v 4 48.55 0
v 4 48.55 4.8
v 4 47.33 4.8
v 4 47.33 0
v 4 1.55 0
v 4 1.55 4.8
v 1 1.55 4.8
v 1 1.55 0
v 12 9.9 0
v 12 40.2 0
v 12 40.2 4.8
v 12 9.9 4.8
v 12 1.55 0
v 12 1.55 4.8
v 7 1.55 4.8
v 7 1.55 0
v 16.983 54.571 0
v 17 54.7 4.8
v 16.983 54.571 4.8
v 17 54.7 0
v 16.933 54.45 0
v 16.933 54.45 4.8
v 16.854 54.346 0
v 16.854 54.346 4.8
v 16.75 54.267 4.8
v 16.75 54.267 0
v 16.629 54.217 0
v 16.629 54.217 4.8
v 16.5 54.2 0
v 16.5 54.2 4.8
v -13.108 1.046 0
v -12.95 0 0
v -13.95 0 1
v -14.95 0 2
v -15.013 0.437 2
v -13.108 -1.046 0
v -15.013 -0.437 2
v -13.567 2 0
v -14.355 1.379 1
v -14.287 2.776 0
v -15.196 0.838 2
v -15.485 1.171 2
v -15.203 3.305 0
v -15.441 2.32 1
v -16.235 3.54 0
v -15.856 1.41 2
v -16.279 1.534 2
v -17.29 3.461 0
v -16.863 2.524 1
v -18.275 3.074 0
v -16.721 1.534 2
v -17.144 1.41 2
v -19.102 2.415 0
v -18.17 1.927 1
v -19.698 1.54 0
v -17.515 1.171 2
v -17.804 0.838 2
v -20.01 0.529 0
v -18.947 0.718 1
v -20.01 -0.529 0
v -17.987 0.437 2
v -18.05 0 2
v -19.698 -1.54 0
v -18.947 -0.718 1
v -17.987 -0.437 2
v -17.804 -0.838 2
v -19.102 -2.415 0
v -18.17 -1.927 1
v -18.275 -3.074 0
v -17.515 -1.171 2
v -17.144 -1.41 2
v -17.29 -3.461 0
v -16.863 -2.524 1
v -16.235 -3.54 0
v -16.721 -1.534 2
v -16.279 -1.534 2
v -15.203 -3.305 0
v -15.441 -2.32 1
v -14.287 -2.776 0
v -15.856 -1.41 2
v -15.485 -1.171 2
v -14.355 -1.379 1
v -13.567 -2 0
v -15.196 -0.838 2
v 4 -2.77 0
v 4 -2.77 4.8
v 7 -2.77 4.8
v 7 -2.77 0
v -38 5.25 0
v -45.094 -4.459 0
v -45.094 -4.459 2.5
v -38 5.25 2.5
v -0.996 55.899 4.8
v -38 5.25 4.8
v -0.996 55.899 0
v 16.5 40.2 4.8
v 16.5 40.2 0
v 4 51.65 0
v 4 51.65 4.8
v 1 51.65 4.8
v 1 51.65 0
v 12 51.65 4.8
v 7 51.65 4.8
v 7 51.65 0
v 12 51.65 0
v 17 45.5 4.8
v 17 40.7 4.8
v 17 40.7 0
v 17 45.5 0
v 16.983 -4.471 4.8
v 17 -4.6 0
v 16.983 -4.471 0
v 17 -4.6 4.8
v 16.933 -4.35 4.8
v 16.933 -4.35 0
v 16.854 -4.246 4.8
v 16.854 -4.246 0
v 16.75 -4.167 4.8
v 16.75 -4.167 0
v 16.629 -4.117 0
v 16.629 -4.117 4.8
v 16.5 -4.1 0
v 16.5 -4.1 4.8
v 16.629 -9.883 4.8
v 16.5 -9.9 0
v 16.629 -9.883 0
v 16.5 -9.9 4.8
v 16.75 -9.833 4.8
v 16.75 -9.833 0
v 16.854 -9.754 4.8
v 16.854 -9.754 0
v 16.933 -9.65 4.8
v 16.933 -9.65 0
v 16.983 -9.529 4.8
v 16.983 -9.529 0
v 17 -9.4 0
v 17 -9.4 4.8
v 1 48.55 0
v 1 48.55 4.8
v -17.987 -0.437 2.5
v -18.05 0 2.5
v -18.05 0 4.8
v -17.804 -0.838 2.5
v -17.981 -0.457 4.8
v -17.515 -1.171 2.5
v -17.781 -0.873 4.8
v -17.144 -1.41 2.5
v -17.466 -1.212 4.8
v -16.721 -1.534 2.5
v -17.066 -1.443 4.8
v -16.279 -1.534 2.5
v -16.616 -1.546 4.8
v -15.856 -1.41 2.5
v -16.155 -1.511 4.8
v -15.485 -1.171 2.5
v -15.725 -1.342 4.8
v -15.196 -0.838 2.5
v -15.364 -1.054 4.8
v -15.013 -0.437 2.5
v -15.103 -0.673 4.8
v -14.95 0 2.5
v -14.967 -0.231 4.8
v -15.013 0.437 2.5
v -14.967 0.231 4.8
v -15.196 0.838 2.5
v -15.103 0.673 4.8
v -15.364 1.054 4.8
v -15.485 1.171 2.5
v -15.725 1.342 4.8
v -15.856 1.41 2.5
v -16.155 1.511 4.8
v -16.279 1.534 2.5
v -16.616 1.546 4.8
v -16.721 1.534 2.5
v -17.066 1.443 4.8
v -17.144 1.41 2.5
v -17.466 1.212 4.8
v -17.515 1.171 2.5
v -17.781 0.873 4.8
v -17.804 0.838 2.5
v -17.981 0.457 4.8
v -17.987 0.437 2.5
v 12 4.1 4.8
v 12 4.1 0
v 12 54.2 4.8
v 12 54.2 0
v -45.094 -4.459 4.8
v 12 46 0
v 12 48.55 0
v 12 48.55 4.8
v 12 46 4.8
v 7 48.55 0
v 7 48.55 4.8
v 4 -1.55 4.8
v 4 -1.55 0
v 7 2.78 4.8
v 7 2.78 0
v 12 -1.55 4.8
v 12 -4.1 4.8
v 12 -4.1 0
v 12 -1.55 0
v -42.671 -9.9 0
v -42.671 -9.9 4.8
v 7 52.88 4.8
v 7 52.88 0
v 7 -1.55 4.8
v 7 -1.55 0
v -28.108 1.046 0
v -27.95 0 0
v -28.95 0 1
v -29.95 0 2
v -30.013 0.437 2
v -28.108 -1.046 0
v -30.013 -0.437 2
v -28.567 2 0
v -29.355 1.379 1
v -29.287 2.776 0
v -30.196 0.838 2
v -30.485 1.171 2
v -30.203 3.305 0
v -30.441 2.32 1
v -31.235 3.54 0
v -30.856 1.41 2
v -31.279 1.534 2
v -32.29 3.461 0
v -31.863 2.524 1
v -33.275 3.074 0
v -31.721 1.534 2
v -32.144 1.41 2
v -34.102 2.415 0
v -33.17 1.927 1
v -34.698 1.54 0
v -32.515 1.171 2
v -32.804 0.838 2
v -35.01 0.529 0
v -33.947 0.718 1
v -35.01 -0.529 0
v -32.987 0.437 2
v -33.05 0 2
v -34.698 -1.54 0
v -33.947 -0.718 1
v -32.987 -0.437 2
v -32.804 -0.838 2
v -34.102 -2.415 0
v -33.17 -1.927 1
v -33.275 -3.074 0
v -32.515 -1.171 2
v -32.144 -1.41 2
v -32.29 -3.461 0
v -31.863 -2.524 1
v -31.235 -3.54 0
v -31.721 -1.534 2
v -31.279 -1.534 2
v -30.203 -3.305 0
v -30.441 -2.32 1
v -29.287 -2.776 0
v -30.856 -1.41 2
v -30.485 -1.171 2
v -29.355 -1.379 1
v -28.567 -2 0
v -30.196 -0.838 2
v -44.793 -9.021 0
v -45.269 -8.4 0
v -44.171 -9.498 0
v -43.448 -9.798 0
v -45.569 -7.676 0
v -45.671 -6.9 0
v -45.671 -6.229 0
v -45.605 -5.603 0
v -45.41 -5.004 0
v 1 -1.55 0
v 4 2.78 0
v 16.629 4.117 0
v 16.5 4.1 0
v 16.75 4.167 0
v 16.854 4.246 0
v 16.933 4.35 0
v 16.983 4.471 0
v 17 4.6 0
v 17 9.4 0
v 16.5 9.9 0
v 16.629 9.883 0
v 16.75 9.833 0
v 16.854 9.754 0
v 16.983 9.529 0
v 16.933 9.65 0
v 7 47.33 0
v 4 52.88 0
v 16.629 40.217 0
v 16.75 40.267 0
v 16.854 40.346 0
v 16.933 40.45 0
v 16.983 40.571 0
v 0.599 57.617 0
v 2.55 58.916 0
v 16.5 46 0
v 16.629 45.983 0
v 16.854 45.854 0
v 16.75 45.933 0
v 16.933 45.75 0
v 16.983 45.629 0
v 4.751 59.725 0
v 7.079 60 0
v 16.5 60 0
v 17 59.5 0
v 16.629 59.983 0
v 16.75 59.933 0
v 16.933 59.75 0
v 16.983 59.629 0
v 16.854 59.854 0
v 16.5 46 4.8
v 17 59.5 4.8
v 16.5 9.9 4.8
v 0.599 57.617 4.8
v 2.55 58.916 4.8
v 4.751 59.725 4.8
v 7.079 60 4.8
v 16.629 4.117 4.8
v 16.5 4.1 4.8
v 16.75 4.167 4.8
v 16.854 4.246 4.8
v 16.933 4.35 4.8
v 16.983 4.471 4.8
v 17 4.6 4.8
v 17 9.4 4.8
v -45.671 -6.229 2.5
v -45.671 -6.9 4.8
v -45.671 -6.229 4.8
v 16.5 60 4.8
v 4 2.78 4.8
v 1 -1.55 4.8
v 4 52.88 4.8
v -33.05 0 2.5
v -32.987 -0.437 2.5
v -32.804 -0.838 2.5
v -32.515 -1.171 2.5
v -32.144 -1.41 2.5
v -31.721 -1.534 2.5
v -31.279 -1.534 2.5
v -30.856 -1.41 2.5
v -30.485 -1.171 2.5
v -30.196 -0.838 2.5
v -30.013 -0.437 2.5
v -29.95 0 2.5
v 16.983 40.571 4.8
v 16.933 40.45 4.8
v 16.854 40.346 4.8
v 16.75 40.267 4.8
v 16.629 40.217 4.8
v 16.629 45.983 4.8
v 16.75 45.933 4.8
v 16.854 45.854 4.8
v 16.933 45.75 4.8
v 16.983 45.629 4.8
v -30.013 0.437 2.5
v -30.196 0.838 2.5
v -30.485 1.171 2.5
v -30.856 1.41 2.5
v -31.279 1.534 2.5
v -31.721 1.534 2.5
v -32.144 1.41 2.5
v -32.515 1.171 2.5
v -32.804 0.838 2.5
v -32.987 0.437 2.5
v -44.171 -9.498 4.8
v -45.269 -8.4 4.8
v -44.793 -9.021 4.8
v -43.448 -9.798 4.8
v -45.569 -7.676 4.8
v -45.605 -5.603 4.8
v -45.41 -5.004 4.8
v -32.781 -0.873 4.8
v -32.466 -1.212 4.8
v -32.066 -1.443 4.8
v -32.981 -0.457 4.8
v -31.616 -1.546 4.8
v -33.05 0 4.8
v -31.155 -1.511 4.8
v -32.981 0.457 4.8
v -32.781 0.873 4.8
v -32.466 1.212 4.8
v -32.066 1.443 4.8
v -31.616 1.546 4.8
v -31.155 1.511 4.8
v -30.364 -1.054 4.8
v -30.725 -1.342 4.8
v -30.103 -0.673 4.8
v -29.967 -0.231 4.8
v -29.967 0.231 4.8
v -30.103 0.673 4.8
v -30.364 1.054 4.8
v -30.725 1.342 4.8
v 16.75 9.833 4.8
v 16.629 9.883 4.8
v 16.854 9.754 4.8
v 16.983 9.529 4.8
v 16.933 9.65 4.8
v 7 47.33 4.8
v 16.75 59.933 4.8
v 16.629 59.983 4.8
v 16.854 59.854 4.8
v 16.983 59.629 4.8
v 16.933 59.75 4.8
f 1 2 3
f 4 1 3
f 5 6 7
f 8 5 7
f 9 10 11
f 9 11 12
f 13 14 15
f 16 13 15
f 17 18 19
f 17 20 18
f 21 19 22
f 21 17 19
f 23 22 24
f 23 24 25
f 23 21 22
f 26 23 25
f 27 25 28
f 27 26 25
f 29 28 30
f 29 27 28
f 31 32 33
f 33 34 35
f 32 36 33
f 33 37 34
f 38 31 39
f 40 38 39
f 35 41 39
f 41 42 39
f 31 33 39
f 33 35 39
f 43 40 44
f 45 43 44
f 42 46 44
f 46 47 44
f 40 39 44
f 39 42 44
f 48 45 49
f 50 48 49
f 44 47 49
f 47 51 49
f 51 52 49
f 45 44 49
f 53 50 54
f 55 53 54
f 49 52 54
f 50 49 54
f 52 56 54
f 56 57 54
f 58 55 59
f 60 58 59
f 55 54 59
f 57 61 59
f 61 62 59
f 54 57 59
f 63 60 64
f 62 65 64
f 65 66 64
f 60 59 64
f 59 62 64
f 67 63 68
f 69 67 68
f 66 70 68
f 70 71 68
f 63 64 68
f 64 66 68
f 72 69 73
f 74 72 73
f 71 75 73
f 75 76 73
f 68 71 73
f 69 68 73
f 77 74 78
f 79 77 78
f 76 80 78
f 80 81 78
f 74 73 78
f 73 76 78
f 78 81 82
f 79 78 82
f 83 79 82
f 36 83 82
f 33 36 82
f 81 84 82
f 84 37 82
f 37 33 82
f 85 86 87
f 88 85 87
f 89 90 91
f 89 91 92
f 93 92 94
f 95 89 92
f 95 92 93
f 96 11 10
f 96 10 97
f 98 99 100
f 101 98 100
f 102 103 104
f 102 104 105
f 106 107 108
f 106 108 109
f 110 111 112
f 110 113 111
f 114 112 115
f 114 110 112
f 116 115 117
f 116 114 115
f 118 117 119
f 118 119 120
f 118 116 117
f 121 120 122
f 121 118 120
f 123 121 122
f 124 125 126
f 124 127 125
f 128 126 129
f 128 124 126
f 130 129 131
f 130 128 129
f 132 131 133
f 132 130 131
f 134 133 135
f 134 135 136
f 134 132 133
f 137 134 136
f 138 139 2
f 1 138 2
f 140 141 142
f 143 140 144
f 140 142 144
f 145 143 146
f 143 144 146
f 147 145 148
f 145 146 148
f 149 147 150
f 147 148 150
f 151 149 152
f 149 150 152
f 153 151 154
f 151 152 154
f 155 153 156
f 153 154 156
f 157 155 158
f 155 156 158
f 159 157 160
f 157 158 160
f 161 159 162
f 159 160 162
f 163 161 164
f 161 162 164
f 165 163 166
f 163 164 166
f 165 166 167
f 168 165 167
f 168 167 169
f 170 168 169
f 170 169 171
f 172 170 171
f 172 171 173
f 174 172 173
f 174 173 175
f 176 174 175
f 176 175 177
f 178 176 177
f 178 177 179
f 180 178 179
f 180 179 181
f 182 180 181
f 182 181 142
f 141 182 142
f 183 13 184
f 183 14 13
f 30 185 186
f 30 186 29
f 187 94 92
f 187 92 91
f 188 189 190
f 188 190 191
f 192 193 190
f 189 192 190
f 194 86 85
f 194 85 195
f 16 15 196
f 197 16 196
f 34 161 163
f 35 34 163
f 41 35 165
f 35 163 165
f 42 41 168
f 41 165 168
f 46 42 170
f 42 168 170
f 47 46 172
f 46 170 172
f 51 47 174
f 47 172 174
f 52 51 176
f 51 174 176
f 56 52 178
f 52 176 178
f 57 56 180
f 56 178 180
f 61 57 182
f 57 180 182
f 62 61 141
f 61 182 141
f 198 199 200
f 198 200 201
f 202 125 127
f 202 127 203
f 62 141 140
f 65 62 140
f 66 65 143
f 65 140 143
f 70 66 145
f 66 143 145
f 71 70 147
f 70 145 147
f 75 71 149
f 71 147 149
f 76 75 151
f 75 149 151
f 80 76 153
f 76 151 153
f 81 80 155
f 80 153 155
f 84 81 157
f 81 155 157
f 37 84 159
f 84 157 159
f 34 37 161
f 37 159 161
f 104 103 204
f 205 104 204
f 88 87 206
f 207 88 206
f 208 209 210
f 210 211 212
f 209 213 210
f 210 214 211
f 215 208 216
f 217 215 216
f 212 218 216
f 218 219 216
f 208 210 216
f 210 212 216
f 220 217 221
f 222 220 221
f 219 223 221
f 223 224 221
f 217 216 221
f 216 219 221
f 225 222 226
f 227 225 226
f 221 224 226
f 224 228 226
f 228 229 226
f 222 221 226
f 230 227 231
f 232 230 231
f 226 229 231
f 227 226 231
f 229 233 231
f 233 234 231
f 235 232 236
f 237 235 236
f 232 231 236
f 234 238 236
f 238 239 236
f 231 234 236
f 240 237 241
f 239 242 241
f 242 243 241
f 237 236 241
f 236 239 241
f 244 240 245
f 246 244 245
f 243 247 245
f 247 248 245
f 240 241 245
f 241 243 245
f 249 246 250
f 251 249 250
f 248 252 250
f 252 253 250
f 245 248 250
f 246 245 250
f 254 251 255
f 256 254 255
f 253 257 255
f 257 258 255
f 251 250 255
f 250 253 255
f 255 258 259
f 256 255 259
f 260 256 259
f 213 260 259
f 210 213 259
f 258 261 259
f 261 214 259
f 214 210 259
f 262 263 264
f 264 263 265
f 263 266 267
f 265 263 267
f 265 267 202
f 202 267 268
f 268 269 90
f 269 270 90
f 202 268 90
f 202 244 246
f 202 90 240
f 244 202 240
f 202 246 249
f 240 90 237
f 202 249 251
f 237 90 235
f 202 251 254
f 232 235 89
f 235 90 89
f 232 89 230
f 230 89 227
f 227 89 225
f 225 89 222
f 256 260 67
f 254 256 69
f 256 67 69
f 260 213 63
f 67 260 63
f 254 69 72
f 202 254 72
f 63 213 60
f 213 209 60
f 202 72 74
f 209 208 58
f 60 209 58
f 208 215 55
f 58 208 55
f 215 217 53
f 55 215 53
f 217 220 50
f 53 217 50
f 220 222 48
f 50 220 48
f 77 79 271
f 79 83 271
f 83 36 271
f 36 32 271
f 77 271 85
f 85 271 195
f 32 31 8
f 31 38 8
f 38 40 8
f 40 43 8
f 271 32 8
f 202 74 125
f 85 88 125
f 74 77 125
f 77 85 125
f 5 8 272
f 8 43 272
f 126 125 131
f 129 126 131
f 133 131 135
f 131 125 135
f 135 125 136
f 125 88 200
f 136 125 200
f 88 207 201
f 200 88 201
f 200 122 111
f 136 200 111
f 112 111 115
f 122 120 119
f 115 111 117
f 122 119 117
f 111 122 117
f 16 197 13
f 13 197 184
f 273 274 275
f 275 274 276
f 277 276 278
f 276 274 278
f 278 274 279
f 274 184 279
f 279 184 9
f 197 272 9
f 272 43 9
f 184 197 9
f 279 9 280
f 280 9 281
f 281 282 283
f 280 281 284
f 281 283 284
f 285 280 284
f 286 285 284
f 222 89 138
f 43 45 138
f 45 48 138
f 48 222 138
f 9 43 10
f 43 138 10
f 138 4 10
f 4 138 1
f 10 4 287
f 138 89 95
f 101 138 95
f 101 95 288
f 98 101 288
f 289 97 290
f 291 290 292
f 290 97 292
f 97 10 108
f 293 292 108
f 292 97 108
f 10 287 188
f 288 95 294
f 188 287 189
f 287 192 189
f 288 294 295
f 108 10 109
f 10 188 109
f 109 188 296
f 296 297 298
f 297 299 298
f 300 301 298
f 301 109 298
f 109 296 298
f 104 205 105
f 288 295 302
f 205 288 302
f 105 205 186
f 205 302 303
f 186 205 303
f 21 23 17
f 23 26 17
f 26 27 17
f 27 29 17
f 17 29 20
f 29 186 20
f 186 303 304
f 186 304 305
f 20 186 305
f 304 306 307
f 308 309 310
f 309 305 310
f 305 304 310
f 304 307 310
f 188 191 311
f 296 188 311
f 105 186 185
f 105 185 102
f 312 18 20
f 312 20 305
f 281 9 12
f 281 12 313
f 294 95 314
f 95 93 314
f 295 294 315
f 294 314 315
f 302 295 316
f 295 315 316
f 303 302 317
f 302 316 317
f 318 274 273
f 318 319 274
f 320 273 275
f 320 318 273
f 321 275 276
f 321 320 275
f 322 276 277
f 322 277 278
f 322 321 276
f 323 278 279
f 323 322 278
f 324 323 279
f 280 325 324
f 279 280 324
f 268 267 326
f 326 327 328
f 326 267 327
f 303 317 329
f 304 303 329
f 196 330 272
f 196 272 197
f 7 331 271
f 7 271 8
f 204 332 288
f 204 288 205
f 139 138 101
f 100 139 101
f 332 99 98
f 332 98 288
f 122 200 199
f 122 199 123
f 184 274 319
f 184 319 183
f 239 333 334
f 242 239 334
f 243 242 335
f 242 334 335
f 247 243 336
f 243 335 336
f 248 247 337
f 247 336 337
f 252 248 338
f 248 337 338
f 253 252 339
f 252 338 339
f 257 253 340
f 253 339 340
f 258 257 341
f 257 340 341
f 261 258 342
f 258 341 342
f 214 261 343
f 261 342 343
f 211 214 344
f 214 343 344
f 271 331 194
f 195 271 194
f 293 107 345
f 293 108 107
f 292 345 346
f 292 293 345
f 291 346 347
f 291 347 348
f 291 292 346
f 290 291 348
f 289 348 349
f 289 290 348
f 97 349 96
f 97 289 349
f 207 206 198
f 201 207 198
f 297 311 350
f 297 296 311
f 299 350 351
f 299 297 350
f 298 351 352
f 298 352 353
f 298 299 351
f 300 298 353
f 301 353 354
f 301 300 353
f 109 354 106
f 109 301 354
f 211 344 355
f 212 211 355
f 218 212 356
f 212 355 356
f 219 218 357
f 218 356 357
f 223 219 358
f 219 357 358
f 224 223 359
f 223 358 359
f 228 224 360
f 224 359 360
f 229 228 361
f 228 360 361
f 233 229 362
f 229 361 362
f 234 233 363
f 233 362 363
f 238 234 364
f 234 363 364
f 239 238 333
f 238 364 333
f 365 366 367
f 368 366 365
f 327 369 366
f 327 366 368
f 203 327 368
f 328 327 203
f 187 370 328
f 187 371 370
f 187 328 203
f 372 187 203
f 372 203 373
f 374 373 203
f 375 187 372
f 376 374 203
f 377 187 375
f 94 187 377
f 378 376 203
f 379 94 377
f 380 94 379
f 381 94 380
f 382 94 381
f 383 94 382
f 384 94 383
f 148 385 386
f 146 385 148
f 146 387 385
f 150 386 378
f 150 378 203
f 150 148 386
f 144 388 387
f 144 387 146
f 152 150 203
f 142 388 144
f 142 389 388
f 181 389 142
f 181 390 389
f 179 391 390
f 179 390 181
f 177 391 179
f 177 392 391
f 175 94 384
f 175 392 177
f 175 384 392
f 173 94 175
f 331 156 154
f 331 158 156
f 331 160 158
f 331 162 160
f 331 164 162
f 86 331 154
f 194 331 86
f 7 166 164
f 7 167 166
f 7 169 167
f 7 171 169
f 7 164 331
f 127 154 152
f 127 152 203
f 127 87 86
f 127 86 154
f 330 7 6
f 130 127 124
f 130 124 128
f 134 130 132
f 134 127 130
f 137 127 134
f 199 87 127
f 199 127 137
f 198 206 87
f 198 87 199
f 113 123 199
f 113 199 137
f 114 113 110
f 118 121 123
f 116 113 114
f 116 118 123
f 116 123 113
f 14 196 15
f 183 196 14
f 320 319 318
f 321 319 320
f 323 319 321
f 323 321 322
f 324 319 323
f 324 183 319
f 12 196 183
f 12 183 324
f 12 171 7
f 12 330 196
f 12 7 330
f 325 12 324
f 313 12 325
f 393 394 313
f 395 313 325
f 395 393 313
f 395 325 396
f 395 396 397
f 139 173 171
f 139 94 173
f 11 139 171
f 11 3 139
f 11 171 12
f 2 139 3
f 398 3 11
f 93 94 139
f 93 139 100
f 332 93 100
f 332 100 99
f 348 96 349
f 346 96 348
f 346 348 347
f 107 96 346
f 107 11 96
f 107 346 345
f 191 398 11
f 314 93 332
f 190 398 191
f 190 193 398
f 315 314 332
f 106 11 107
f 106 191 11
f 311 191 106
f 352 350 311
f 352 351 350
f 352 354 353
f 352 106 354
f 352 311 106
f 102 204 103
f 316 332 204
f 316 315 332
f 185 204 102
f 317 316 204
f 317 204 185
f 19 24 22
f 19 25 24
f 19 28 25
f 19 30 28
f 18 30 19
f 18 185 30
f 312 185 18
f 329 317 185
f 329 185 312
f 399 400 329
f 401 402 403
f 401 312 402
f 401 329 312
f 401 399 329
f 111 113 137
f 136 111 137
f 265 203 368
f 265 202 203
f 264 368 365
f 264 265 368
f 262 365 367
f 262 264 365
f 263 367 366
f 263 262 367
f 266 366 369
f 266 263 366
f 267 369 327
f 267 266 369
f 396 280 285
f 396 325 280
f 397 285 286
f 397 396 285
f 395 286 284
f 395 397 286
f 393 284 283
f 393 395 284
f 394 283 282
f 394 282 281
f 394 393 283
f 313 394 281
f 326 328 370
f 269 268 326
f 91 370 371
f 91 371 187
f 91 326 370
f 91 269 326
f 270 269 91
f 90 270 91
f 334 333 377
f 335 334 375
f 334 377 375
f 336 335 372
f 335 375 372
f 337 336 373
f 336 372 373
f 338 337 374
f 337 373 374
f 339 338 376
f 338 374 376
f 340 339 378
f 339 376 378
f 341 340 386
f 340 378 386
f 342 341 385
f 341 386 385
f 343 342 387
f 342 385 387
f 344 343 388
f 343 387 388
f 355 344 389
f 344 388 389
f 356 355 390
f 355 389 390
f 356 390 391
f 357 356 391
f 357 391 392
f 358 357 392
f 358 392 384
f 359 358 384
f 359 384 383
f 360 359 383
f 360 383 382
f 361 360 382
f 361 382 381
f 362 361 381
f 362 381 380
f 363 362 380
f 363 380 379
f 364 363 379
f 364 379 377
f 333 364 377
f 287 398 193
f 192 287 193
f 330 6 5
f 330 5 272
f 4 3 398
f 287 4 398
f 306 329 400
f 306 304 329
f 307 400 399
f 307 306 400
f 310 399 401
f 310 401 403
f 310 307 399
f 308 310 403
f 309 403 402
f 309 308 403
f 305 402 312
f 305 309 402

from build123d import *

# Parameters (mm, degrees)
BOSS_EXTRU_1_DEPTH                  = 4.8
ENL_V_MAT_EXTRU_1_DEPTH             = 2.3
D_POUILLE1_ANGLE                    = -36.151625355
DIAM_TRE_DU_PER_AGE_3_1_3_1_1_D     = 3.1
DIAM_TRE_DU_PER_AGE_3_1_3_1_1_DEPTH = 4.8
CONG_1_R                            = 10
ESQUISSE5_R                         = 1.55
BOSS_EXTRU_2_DEPTH                  = 4.8
ENL_V_MAT_EXTRU_2_DEPTH             = 78.657948853
ESQUISSE6_W                         = 3
ESQUISSE6_H                         = 3.1
ESQUISSE6_H_2                       = 1.22
ESQUISSE6_W_2                       = 5
ESQUISSE6_H_3                       = 1.23
ENL_V_MAT_EXTRU_3_DEPTH             = 76.557273061
ESQUISSE7_W                         = 5
ESQUISSE7_H                         = 5.8
BOSS_EXTRU_3_DEPTH                  = 4.8
CONG_2_R                            = 3
CONG_3_R                            = 0.5
CHANFREIN1_SIZE                     = 2


with BuildPart() as part:
    # Esquisse1 → Boss.-Extru.1 (new body)
    with BuildSketch(Plane(origin=(0, 0, 0), x_dir=(-1, 0, 0), z_dir=(0, 0, -1))):
        with BuildLine():
            Line((38, -9.9), (38, 60))
            Line((38, 60), (-12, 60))
            Line((-12, 60), (-12, 11.9))
            ThreePointArc((-12, 11.9), (-11, 10.9), (-12, 9.9))
            Line((-12, 9.9), (-17, 9.9))
            Line((-17, 9.9), (-17, 4.1))
            Line((-17, 4.1), (-12, 4.1))
            ThreePointArc((-12, 4.1), (-11, 3.1), (-12, 2.1))
            Line((-12, 2.1), (-12, -2.1))
            ThreePointArc((-12, -2.1), (-11, -3.1), (-12, -4.1))
            Line((-12, -4.1), (-17, -4.1))
            Line((-17, -4.1), (-17, -9.9))
            Line((-17, -9.9), (38, -9.9))
        make_face()
    extrude(amount=-BOSS_EXTRU_1_DEPTH)

    # Esquisse2 → Enl_v. mat.-Extru.1 (cut)
    with BuildSketch(Plane.XY.offset(4.8)):
        with BuildLine():
            Line((-38, -5.25), (7, -5.25))
            ThreePointArc((7, -5.25), (8, -4.25), (7, -3.25))
            Line((7, -3.25), (7, 3.25))
            ThreePointArc((7, 3.25), (8, 4.25), (7, 5.25))
            Line((7, 5.25), (-38, 5.25))
            Line((-38, 5.25), (-38, -5.25))
        make_face()
    extrude(amount=-ENL_V_MAT_EXTRU_1_DEPTH, mode=Mode.SUBTRACT)

    # D_pouille1
    d_pouille1_faces = [part.faces().sort_by_distance(p)[0] for p in [
        (-38, 26.992889488, 2.303049427),
    ]]
    draft(d_pouille1_faces, Plane(origin=(7, 5.25, 2.5), x_dir=(-1, 0, 0), z_dir=(0, -1, 0)), D_POUILLE1_ANGLE)

    # Diam_tre du per_age _3.1 _3.1_1
    with Locations(Plane(origin=(0, 0, 0), x_dir=(-1, 0, 0), z_dir=(0, 0, -1))):
        with Locations((16.5, 0), (31.5, 0)):
            Hole(DIAM_TRE_DU_PER_AGE_3_1_3_1_1_D / 2, depth=DIAM_TRE_DU_PER_AGE_3_1_3_1_1_DEPTH)

    # Cong_1
    cong_1_edges = [part.edges().sort_by_distance(p)[0] for p in [
        (2, 60, 2.4),
    ]]
    fillet(cong_1_edges, radius=CONG_1_R)

    # Esquisse5 → Boss.-Extru.2 (add)
    with BuildSketch(Plane.XY.offset(4.8)):
        with BuildLine():
            Line((-38, 5.25), (-45.671232877, -5.25))
            Line((-45.671232877, -5.25), (7, -5.25))
            ThreePointArc((7, -5.25), (8, -4.25), (7, -3.25))
            Line((7, -3.25), (7, 3.25))
            ThreePointArc((7, 3.25), (8, 4.25), (7, 5.25))
            Line((7, 5.25), (-38, 5.25))
        make_face()
        with Locations(Location((-31.5, 0, 0), (0, 0, 180))):
            Circle(ESQUISSE5_R, mode=Mode.SUBTRACT)
        with Locations(Location((-16.5, 0, 0), (0, 0, 180))):
            Circle(ESQUISSE5_R, mode=Mode.SUBTRACT)
        with BuildLine():
            ThreePointArc((12, -2.1), (11, -3.1), (12, -4.1))
            Line((12, -4.1), (12, -2.1))
        make_face()
        with BuildLine():
            ThreePointArc((12, 4.1), (11, 3.1), (12, 2.1))
            Line((12, 2.1), (12, 4.1))
        make_face()
        with BuildLine():
            Line((12, 9.9), (12, 11.9))
            ThreePointArc((12, 11.9), (11, 10.9), (12, 9.9))
        make_face()
    extrude(amount=-BOSS_EXTRU_2_DEPTH)

    # Esquisse5_4 → Enl_v. mat.-Extru.2 (cut, through all)
    with BuildSketch(Plane.XY.offset(4.8)):
        Polygon((-45.671232877, -9.9), (-45.671232877, -5.25), (-49.068493151, -9.9), align=None)
    extrude(amount=-ENL_V_MAT_EXTRU_2_DEPTH, mode=Mode.SUBTRACT)

    # Esquisse6 → Enl_v. mat.-Extru.3 (cut, through all)
    with BuildSketch(Plane.XY.offset(4.8)):
        with Locations((2.5, 0)):
            Rectangle(ESQUISSE6_W, ESQUISSE6_H)
        with Locations((5.5, 0)):
            Rectangle(ESQUISSE6_W, ESQUISSE6_H)
        with Locations((5.5, -2.16)):
            Rectangle(ESQUISSE6_W, ESQUISSE6_H_2)
        with Locations((9.5, 0)):
            Rectangle(ESQUISSE6_W_2, ESQUISSE6_H)
        with Locations((5.5, 2.165)):
            Rectangle(ESQUISSE6_W, ESQUISSE6_H_3)
        with Locations((5.5, 47.94)):
            Rectangle(ESQUISSE6_W, ESQUISSE6_H_2)
        with Locations((5.5, 50.1)):
            Rectangle(ESQUISSE6_W, ESQUISSE6_H)
        with Locations((2.5, 50.1)):
            Rectangle(ESQUISSE6_W, ESQUISSE6_H)
        with Locations((5.5, 52.265)):
            Rectangle(ESQUISSE6_W, ESQUISSE6_H_3)
        with Locations((9.5, 50.1)):
            Rectangle(ESQUISSE6_W_2, ESQUISSE6_H)
    extrude(amount=-ENL_V_MAT_EXTRU_3_DEPTH, mode=Mode.SUBTRACT)

    # Esquisse7 → Boss.-Extru.3 (add)
    with BuildSketch(Plane.XY.offset(4.8)):
        with Locations((14.5, 57.1)):
            Rectangle(ESQUISSE7_W, ESQUISSE7_H)
        with Locations((14.5, 43.1)):
            Rectangle(ESQUISSE7_W, ESQUISSE7_H)
    extrude(amount=-BOSS_EXTRU_3_DEPTH)

    # Cong_2
    cong_2_edges = [part.edges().sort_by_distance(p)[0] for p in [
        (-45.671232877, -5.25, 2.4),
        (-45.671232877, -9.9, 2.4),
    ]]
    fillet(cong_2_edges, radius=CONG_2_R)

    # Cong_3
    cong_3_edges = [part.edges().sort_by_distance(p)[0] for p in [
        (17, -9.9, 2.4),
        (17, -4.1, 2.4),
        (17, 4.1, 2.4),
        (17, 9.9, 2.4),
        (17, 46, 2.4),
        (17, 40.2, 2.4),
        (17, 60, 2.4),
        (17, 54.2, 2.4),
    ]]
    fillet(cong_3_edges, radius=CONG_3_R)

    # Chanfrein1
    chanfrein1_edges = [part.edges().sort_by_distance(p)[0] for p in [
        (-31.5, 1.55, 0),
        (-16.5, 1.55, 0),
    ]]
    chamfer(chanfrein1_edges, length=CHANFREIN1_SIZE)


solid = part.part
